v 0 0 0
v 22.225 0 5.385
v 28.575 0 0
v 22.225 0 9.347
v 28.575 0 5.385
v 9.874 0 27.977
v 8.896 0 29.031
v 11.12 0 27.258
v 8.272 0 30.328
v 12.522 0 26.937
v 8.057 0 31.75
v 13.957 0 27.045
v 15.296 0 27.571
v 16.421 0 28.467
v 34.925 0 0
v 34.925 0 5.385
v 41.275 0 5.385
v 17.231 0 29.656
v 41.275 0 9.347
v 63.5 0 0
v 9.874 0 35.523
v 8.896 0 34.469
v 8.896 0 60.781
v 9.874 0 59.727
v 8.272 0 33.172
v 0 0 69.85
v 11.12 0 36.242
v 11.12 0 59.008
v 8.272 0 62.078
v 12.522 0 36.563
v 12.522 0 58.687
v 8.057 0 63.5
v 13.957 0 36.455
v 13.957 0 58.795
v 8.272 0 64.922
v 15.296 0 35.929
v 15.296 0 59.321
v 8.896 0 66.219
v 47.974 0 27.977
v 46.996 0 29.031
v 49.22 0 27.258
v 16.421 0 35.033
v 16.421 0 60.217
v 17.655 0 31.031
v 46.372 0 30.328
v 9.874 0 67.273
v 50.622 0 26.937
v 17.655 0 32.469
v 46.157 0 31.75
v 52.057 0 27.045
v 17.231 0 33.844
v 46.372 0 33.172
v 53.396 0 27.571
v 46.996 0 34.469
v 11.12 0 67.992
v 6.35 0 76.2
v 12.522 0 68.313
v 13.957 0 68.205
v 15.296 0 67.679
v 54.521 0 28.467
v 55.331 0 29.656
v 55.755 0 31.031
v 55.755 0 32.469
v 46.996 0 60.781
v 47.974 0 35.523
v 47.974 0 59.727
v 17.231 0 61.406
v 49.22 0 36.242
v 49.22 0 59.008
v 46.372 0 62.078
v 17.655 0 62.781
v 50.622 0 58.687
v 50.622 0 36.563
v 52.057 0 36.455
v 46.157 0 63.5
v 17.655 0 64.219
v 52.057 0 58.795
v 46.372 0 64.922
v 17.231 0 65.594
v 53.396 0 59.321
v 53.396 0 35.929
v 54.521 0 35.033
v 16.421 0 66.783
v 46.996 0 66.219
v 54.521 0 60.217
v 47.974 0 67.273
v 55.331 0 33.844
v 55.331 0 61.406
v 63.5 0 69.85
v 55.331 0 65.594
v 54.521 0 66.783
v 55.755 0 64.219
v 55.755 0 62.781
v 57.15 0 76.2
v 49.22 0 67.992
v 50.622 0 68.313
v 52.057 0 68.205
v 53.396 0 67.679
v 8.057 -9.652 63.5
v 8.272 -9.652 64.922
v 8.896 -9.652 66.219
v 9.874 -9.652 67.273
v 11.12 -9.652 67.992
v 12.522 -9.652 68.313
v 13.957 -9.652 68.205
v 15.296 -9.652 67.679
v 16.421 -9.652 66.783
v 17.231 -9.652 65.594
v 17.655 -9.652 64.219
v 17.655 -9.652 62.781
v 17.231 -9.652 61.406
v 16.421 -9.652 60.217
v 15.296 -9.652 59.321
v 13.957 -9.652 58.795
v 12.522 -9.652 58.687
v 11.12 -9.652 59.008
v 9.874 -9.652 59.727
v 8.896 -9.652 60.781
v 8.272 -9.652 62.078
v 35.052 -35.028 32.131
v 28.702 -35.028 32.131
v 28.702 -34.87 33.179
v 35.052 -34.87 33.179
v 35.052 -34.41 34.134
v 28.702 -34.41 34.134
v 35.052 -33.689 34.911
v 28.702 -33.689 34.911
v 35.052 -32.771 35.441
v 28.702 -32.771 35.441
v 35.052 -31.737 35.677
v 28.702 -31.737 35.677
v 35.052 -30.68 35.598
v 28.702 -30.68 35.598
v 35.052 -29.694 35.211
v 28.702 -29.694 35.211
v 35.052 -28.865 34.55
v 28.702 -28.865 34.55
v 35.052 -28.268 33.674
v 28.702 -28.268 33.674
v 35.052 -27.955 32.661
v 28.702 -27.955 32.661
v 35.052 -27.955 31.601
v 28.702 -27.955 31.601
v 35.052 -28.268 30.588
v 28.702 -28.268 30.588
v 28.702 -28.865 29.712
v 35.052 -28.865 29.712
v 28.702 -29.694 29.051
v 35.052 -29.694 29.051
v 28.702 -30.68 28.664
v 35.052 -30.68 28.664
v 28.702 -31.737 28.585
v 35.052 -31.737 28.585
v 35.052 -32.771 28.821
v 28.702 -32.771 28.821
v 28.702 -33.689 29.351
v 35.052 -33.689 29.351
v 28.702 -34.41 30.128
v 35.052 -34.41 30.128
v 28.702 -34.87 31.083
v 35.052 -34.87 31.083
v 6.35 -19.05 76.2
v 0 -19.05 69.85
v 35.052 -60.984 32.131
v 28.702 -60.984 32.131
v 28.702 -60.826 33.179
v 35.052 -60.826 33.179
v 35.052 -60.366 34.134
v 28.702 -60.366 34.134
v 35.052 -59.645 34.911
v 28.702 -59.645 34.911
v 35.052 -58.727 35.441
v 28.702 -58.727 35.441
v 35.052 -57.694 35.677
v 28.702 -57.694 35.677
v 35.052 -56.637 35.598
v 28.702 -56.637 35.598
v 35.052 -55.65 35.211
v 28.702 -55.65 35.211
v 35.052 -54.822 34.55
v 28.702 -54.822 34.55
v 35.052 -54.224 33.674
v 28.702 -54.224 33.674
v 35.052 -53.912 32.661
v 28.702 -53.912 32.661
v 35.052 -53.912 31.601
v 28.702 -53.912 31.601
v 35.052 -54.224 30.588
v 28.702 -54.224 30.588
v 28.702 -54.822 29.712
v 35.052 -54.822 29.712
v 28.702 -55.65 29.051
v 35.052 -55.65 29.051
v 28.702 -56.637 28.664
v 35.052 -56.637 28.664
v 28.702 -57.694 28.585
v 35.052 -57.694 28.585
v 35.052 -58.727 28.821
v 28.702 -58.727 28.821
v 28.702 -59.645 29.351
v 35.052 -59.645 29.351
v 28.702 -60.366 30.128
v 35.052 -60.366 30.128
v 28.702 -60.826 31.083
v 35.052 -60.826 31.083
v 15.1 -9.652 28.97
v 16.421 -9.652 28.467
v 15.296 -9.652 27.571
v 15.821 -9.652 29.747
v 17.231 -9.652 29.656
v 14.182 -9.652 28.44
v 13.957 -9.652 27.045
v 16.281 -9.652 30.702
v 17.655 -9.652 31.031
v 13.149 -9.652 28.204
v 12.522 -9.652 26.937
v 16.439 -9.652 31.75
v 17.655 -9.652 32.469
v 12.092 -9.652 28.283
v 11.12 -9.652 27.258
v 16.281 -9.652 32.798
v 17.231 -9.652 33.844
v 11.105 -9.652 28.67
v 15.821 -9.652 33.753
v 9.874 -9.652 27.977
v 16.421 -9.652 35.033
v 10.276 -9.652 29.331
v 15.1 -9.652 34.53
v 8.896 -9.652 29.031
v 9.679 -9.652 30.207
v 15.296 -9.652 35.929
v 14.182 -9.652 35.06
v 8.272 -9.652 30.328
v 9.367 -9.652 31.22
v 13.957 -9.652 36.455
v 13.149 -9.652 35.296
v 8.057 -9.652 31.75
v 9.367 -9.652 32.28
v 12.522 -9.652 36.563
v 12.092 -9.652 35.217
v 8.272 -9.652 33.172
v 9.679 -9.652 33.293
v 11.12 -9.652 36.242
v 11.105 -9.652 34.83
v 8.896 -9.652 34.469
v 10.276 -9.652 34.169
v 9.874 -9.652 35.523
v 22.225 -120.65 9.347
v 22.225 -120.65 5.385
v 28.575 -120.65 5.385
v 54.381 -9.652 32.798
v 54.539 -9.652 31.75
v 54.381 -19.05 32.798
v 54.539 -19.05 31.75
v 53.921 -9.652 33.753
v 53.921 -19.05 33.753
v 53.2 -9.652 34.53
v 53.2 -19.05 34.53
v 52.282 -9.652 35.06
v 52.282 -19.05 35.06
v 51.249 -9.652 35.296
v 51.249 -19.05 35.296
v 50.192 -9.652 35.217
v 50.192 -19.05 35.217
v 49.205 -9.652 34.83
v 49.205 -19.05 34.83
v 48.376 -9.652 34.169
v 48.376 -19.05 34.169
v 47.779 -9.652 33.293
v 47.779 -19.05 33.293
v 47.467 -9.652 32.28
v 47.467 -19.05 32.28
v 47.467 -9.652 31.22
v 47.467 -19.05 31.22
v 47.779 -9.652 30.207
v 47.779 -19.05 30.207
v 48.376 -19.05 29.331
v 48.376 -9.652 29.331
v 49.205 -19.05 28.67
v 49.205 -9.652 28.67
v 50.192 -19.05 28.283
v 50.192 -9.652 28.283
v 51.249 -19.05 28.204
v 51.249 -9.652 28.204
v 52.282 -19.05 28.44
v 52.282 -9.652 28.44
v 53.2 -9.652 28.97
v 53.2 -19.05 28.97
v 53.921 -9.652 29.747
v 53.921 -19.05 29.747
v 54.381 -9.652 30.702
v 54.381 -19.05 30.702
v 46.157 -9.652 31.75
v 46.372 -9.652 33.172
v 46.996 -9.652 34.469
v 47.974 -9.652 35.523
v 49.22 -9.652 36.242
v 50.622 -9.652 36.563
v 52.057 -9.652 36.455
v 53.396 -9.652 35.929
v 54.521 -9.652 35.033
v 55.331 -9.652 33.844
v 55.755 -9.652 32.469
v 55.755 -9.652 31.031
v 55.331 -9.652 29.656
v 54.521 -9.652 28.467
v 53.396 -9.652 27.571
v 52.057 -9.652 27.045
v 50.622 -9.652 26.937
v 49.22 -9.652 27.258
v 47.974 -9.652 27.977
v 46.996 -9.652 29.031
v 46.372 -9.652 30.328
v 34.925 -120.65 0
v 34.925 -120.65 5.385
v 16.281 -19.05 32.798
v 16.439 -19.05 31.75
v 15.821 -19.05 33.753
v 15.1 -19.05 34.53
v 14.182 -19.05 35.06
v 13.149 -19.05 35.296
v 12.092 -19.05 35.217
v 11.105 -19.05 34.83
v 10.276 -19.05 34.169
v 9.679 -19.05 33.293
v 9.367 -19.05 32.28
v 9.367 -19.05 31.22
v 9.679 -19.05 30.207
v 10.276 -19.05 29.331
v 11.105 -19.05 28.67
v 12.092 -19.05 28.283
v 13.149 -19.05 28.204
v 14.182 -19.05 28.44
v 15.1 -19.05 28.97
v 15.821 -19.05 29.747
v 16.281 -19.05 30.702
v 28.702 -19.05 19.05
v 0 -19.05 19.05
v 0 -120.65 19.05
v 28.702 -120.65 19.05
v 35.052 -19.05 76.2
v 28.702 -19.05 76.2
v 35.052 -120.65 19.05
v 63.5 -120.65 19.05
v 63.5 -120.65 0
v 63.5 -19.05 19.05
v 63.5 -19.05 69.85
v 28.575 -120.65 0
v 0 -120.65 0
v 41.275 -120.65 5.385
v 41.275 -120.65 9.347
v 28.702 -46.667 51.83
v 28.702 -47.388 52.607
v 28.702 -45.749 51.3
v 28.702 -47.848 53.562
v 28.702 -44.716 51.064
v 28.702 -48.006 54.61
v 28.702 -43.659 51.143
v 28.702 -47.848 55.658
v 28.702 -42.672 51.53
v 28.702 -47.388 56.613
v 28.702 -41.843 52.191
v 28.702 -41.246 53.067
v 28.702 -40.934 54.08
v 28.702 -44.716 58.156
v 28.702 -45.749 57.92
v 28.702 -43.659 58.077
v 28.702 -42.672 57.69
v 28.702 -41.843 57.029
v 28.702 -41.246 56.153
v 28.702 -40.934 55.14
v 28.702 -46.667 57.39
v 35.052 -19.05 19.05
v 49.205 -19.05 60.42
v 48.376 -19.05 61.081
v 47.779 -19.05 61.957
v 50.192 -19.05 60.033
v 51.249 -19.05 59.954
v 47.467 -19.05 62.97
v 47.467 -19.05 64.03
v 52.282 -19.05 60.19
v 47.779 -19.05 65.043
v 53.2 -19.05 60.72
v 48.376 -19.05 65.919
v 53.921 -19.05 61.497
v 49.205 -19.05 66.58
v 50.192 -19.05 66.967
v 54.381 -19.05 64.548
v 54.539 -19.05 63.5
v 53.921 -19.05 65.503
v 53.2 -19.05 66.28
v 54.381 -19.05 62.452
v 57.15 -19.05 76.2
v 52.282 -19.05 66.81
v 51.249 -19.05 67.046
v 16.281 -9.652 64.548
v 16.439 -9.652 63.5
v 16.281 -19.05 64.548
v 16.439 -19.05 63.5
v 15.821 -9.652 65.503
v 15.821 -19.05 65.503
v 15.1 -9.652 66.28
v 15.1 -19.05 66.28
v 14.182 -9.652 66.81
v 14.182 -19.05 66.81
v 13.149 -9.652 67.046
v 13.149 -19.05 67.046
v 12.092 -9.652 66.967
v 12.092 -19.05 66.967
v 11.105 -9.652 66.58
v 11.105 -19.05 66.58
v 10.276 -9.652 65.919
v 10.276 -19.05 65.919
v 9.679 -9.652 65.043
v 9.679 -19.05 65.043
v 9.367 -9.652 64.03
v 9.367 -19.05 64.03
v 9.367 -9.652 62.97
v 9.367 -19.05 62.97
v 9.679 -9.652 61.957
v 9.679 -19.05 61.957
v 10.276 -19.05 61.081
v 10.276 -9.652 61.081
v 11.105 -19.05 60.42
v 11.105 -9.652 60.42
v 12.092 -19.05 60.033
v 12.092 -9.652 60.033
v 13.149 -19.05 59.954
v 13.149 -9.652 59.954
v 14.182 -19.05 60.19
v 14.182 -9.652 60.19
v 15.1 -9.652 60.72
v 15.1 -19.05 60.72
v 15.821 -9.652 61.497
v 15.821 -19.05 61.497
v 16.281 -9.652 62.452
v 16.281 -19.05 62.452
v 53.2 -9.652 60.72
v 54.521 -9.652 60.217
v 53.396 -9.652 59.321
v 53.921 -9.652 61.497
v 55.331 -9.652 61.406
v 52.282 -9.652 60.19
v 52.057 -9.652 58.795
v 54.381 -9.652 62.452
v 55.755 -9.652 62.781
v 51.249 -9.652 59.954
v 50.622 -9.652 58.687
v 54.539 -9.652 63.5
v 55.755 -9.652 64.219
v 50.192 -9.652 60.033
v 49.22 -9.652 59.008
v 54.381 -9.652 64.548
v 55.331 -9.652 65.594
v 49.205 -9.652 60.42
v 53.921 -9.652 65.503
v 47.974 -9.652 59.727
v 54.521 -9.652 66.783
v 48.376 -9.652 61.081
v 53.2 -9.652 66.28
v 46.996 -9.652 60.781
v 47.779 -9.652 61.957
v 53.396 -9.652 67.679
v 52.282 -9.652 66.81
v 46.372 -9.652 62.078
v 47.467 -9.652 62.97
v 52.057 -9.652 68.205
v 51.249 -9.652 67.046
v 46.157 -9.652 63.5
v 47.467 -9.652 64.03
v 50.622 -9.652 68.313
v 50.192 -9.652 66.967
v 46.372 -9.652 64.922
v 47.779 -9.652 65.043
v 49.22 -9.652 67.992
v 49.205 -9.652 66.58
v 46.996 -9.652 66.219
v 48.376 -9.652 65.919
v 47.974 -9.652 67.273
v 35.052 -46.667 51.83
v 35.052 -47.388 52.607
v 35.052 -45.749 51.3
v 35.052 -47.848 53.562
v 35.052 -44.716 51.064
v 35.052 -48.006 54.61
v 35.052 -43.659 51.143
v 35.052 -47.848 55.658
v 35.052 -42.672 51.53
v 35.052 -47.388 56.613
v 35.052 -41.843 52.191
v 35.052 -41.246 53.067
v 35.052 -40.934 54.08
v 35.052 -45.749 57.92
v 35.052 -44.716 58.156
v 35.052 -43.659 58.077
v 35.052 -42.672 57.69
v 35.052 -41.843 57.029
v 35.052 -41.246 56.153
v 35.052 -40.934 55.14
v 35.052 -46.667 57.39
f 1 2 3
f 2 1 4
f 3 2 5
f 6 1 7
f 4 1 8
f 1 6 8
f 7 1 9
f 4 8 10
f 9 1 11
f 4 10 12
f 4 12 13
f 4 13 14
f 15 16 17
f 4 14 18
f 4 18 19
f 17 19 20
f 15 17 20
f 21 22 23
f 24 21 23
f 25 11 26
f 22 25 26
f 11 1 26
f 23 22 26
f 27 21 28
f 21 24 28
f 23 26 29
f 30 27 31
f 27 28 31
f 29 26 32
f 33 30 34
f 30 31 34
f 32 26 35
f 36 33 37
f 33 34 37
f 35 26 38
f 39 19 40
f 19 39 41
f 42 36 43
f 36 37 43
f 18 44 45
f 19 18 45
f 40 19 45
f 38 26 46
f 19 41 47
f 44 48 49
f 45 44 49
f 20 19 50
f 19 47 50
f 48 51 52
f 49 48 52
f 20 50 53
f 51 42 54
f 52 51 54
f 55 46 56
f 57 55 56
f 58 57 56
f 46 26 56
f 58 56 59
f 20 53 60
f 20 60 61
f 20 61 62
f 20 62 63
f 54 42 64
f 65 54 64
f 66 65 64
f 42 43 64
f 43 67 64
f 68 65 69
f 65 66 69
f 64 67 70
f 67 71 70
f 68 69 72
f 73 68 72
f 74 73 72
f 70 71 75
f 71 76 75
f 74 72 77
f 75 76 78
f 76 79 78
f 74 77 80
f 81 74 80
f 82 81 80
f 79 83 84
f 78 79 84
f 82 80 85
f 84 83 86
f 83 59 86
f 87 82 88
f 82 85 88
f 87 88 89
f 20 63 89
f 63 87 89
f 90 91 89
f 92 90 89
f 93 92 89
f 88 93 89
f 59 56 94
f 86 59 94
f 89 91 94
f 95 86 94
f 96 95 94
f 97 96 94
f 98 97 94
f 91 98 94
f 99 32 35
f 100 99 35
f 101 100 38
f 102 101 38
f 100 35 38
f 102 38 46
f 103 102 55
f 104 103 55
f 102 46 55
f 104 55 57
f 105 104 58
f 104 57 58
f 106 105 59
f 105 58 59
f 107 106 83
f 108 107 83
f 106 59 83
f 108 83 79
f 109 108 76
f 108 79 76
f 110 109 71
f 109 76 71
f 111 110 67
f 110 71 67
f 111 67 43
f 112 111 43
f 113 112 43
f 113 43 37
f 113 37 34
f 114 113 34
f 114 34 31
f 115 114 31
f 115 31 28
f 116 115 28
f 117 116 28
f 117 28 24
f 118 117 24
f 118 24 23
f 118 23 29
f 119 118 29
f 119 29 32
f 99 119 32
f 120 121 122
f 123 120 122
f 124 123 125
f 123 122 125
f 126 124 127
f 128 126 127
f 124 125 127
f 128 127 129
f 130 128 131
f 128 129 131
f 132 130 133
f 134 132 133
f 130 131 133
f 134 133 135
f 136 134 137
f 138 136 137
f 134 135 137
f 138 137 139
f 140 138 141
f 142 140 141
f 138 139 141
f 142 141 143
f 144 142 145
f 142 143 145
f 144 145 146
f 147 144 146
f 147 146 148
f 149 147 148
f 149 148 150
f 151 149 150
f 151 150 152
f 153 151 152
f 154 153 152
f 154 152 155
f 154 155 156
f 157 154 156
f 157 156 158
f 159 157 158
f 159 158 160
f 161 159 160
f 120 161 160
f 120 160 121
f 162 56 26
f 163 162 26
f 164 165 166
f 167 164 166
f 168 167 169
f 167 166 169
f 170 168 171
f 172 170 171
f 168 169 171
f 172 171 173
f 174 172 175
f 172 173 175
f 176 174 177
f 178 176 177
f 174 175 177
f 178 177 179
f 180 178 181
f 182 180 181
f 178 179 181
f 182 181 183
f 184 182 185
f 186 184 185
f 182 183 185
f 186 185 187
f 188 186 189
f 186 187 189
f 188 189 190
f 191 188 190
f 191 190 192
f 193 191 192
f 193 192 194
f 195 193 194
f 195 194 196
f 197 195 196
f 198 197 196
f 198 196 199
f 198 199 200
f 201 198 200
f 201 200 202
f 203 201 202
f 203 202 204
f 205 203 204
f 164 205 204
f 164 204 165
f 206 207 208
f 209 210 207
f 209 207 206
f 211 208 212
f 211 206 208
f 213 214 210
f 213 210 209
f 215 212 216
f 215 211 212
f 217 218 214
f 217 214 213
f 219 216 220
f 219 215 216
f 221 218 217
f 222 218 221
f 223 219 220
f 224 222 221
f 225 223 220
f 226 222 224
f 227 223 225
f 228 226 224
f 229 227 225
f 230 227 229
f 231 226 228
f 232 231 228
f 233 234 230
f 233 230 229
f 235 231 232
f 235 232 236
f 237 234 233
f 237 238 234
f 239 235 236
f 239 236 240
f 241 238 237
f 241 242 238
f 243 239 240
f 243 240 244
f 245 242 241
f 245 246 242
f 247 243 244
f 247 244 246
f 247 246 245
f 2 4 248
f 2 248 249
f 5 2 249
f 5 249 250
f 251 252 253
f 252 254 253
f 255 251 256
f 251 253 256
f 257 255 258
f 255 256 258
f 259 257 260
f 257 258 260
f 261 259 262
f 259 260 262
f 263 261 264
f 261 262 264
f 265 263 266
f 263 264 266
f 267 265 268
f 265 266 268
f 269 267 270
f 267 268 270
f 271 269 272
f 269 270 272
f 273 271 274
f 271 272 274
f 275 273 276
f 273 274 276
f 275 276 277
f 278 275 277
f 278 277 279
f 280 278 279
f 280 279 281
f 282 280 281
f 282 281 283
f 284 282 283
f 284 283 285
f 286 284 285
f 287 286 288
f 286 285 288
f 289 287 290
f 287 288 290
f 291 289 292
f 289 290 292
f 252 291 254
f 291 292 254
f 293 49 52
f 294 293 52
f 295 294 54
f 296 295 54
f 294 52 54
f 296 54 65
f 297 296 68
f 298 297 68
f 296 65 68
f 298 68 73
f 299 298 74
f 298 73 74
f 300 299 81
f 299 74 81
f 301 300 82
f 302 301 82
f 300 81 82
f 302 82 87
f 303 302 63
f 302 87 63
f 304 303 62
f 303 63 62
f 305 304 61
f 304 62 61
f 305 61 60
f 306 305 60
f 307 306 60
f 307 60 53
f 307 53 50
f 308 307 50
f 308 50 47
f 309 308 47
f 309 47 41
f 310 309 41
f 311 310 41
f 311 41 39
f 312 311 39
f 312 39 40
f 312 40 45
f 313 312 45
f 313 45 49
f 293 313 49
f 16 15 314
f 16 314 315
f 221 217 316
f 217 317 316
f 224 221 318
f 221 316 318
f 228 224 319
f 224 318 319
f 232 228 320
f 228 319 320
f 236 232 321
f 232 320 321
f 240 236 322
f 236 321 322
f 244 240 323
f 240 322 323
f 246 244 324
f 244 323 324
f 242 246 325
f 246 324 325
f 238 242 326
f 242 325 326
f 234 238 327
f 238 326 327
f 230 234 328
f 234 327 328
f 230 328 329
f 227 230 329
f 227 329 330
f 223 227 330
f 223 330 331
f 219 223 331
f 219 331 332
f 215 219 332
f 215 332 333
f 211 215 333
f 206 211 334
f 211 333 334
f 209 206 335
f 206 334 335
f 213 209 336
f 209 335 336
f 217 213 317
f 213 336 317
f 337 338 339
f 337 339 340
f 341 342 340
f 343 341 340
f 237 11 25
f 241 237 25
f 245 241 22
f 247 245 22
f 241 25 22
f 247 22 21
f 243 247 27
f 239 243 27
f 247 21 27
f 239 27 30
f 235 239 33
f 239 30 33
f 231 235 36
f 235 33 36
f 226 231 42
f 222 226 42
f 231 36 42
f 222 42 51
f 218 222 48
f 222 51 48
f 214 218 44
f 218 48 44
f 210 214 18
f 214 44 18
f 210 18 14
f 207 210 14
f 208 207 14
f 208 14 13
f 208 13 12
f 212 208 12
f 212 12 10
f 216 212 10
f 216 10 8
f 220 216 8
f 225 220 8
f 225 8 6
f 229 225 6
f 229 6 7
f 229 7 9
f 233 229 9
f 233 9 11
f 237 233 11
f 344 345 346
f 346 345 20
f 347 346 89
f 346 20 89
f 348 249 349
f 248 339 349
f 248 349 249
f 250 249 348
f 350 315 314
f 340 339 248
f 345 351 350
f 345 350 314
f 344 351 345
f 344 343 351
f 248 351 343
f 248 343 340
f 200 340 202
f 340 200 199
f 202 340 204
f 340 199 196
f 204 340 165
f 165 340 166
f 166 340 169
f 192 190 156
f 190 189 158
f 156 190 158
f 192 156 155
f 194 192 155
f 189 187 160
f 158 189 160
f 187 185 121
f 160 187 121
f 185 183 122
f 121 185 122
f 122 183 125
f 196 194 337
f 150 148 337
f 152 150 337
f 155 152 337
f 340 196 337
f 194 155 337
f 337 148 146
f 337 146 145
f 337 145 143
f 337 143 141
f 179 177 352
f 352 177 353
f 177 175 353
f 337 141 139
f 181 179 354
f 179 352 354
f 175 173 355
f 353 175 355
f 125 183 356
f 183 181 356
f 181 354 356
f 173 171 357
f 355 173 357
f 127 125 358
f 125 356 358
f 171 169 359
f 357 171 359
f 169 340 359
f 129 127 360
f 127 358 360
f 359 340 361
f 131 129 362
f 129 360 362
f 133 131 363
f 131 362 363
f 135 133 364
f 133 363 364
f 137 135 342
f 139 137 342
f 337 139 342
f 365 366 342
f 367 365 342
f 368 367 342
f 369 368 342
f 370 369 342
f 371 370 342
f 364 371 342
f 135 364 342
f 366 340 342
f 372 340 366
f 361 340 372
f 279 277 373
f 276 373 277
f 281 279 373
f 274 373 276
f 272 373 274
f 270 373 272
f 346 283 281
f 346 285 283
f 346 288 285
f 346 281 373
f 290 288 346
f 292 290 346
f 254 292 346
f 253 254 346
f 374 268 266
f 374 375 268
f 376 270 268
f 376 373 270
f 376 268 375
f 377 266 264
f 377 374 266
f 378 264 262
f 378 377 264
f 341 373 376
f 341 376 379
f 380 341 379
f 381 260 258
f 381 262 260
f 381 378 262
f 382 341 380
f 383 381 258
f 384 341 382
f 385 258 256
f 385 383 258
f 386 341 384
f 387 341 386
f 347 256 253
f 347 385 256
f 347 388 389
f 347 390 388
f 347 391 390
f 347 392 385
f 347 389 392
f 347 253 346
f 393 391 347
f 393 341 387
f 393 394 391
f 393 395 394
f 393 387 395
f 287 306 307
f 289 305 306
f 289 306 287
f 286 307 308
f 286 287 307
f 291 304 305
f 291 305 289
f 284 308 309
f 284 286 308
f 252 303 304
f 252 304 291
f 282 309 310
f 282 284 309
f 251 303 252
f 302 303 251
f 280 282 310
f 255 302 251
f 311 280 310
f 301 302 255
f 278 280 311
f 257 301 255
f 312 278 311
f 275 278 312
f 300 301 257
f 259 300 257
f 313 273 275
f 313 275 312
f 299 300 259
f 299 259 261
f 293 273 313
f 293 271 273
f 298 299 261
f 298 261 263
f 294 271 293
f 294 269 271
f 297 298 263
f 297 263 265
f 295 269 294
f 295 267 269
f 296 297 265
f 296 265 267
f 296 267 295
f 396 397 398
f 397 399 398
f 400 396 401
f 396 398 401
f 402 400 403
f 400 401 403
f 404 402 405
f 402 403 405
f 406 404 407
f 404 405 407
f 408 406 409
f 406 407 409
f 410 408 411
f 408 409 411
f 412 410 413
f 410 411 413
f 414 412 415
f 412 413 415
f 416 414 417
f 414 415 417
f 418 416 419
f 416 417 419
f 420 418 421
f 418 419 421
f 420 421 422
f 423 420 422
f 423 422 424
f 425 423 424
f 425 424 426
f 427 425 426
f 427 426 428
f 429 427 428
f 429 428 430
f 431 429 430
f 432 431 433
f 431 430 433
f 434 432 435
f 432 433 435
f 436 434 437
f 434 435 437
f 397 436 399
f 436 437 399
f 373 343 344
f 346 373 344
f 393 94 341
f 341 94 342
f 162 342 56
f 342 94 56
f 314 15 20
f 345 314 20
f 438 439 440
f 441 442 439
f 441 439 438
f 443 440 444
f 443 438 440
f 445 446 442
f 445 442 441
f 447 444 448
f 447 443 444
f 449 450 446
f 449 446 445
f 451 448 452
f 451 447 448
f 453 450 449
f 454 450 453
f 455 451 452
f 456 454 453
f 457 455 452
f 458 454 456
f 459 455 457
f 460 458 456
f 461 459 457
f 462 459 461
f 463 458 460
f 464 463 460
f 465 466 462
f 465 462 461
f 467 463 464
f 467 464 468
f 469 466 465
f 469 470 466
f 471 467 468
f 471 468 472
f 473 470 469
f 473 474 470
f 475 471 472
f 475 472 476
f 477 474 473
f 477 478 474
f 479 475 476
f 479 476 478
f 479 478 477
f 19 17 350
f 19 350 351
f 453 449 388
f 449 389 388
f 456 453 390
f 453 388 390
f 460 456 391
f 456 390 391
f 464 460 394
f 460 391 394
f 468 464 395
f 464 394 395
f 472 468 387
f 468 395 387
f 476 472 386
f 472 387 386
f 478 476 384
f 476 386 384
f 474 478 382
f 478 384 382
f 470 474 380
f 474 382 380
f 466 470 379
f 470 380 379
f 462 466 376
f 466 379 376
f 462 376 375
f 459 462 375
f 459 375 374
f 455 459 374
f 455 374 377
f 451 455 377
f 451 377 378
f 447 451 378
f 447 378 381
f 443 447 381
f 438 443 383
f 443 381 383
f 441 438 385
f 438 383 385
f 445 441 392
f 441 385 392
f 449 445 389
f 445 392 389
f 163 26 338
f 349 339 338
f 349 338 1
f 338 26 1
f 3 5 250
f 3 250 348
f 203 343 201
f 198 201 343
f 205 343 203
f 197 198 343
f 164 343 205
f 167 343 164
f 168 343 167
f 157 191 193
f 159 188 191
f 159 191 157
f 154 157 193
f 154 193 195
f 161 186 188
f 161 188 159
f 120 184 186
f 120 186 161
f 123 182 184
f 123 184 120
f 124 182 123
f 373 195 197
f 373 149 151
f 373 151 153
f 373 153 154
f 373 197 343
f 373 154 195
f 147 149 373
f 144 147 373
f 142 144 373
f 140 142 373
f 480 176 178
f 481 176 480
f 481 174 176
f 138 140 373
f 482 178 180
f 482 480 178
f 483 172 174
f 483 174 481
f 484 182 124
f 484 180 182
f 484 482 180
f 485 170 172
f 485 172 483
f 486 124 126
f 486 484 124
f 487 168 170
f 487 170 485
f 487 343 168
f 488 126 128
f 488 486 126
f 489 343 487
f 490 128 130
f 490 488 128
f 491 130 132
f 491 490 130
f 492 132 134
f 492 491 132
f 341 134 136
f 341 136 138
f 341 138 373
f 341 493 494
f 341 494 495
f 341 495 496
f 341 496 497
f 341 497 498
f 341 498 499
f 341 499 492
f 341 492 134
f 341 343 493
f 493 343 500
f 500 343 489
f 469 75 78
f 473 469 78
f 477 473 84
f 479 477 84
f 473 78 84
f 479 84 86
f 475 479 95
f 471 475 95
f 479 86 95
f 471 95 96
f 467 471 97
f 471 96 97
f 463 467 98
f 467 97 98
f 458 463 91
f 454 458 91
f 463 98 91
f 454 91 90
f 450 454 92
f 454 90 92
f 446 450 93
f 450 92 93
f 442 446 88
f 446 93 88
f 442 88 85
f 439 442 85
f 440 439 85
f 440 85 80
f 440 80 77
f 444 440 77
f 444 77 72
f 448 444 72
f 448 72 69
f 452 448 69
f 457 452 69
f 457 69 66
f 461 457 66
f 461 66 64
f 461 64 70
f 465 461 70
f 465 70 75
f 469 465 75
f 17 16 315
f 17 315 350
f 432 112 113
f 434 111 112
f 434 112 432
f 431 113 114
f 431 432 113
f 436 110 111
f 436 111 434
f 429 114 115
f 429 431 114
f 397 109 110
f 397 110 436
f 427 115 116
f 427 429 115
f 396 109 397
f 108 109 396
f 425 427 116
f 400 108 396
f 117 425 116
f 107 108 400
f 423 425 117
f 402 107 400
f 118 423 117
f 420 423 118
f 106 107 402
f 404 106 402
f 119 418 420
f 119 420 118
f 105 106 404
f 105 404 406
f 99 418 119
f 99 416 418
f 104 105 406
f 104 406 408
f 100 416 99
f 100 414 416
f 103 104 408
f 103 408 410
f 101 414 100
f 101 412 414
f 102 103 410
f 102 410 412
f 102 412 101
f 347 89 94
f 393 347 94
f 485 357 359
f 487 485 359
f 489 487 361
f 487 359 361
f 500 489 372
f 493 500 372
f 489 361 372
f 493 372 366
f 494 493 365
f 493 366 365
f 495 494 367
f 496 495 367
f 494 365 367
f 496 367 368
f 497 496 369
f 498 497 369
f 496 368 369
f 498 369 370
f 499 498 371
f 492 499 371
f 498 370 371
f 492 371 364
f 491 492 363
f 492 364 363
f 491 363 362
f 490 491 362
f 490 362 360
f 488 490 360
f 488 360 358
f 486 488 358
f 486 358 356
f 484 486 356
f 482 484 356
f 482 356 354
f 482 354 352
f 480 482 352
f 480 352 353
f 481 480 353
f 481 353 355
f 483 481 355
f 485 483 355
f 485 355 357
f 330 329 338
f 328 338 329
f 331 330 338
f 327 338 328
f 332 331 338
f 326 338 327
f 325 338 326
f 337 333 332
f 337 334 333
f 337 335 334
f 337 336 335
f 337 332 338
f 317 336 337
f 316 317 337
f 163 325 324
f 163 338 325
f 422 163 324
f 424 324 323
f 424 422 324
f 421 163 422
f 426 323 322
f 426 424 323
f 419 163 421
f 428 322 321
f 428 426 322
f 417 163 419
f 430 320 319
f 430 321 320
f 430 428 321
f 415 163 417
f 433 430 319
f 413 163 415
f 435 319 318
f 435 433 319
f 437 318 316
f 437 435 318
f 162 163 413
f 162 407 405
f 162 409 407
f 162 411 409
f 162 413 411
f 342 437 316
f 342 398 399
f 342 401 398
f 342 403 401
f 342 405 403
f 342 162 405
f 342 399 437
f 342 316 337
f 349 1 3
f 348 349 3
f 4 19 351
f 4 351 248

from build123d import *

# Parameters (mm, degrees)
F1_DEPTH       = 19.05
F3_W           = 63.5
F3_H           = 19.05
F4_DEPTH       = 120.65
F5_DEPTH       = 120.65
F7_D           = 7.112
F7_CBORE_D     = 9.652
F7_CBORE_DEPTH = 9.652
F9_START       = 28.702
F9_DEPTH       = 6.35
F11_D          = 7.112
F11_DEPTH      = 12.7
F11_TIP        = 2.1366603613


with BuildPart() as f1:
    # F0 (on Front) → F1 (new body)
    with BuildSketch(Plane.XZ):
        Polygon((6.35, 76.2), (0, 69.85), (0, 0), (63.5, 0), (63.5, 69.85), (57.15, 76.2), align=None)
    extrude(amount=F1_DEPTH)

    # F3 (on Front) → F4 (join)
    with BuildSketch(Plane.XZ):
        with Locations((31.75, 9.525)):
            Rectangle(F3_W, F3_H)
    extrude(amount=F4_DEPTH)

    # F2 (on Front) → F5 (cut)
    with BuildSketch(Plane.XZ):
        Polygon((28.575, 0), (34.925, 0), (34.925, 5.3848), (41.275, 5.3848), (41.275, 9.3472), (22.225, 9.3472), (22.225, 5.3848), (28.575, 5.3848), align=None)
    extrude(amount=F5_DEPTH, mode=Mode.SUBTRACT)

    # F7 (through all)
    with Locations(Plane(origin=(0, 0, 0), x_dir=(-1, 0, 0), z_dir=(0, 1, 0))):
        with Locations((-50.9831043839, 63.5), (-12.8831043839, 63.5), (-12.8831043839, 31.75), (-50.9831043839, 31.75)):
            CounterBoreHole(F7_D / 2, F7_CBORE_D / 2, F7_CBORE_DEPTH)

    # F8 (on Right) → F9 (join)
    with BuildSketch(Plane.YZ.offset(F9_START)):
        Polygon((-19.05, 76.2), (-120.65, 19.05), (-19.05, 19.05), align=None)
    extrude(amount=F9_DEPTH)

    # F11
    with Locations(Plane.YZ.offset(35.052)):
        with Locations((-44.45, 54.61), (-31.4717432989, 32.131), (-57.4282567011, 32.131)):
            Hole(F11_D / 2, depth=F11_DEPTH)
            with Locations((0, 0, -(F11_DEPTH + F11_TIP / 2))):  # 118° drill point
                Cone(0, F11_D / 2, F11_TIP, mode=Mode.SUBTRACT)


solid = f1.part
